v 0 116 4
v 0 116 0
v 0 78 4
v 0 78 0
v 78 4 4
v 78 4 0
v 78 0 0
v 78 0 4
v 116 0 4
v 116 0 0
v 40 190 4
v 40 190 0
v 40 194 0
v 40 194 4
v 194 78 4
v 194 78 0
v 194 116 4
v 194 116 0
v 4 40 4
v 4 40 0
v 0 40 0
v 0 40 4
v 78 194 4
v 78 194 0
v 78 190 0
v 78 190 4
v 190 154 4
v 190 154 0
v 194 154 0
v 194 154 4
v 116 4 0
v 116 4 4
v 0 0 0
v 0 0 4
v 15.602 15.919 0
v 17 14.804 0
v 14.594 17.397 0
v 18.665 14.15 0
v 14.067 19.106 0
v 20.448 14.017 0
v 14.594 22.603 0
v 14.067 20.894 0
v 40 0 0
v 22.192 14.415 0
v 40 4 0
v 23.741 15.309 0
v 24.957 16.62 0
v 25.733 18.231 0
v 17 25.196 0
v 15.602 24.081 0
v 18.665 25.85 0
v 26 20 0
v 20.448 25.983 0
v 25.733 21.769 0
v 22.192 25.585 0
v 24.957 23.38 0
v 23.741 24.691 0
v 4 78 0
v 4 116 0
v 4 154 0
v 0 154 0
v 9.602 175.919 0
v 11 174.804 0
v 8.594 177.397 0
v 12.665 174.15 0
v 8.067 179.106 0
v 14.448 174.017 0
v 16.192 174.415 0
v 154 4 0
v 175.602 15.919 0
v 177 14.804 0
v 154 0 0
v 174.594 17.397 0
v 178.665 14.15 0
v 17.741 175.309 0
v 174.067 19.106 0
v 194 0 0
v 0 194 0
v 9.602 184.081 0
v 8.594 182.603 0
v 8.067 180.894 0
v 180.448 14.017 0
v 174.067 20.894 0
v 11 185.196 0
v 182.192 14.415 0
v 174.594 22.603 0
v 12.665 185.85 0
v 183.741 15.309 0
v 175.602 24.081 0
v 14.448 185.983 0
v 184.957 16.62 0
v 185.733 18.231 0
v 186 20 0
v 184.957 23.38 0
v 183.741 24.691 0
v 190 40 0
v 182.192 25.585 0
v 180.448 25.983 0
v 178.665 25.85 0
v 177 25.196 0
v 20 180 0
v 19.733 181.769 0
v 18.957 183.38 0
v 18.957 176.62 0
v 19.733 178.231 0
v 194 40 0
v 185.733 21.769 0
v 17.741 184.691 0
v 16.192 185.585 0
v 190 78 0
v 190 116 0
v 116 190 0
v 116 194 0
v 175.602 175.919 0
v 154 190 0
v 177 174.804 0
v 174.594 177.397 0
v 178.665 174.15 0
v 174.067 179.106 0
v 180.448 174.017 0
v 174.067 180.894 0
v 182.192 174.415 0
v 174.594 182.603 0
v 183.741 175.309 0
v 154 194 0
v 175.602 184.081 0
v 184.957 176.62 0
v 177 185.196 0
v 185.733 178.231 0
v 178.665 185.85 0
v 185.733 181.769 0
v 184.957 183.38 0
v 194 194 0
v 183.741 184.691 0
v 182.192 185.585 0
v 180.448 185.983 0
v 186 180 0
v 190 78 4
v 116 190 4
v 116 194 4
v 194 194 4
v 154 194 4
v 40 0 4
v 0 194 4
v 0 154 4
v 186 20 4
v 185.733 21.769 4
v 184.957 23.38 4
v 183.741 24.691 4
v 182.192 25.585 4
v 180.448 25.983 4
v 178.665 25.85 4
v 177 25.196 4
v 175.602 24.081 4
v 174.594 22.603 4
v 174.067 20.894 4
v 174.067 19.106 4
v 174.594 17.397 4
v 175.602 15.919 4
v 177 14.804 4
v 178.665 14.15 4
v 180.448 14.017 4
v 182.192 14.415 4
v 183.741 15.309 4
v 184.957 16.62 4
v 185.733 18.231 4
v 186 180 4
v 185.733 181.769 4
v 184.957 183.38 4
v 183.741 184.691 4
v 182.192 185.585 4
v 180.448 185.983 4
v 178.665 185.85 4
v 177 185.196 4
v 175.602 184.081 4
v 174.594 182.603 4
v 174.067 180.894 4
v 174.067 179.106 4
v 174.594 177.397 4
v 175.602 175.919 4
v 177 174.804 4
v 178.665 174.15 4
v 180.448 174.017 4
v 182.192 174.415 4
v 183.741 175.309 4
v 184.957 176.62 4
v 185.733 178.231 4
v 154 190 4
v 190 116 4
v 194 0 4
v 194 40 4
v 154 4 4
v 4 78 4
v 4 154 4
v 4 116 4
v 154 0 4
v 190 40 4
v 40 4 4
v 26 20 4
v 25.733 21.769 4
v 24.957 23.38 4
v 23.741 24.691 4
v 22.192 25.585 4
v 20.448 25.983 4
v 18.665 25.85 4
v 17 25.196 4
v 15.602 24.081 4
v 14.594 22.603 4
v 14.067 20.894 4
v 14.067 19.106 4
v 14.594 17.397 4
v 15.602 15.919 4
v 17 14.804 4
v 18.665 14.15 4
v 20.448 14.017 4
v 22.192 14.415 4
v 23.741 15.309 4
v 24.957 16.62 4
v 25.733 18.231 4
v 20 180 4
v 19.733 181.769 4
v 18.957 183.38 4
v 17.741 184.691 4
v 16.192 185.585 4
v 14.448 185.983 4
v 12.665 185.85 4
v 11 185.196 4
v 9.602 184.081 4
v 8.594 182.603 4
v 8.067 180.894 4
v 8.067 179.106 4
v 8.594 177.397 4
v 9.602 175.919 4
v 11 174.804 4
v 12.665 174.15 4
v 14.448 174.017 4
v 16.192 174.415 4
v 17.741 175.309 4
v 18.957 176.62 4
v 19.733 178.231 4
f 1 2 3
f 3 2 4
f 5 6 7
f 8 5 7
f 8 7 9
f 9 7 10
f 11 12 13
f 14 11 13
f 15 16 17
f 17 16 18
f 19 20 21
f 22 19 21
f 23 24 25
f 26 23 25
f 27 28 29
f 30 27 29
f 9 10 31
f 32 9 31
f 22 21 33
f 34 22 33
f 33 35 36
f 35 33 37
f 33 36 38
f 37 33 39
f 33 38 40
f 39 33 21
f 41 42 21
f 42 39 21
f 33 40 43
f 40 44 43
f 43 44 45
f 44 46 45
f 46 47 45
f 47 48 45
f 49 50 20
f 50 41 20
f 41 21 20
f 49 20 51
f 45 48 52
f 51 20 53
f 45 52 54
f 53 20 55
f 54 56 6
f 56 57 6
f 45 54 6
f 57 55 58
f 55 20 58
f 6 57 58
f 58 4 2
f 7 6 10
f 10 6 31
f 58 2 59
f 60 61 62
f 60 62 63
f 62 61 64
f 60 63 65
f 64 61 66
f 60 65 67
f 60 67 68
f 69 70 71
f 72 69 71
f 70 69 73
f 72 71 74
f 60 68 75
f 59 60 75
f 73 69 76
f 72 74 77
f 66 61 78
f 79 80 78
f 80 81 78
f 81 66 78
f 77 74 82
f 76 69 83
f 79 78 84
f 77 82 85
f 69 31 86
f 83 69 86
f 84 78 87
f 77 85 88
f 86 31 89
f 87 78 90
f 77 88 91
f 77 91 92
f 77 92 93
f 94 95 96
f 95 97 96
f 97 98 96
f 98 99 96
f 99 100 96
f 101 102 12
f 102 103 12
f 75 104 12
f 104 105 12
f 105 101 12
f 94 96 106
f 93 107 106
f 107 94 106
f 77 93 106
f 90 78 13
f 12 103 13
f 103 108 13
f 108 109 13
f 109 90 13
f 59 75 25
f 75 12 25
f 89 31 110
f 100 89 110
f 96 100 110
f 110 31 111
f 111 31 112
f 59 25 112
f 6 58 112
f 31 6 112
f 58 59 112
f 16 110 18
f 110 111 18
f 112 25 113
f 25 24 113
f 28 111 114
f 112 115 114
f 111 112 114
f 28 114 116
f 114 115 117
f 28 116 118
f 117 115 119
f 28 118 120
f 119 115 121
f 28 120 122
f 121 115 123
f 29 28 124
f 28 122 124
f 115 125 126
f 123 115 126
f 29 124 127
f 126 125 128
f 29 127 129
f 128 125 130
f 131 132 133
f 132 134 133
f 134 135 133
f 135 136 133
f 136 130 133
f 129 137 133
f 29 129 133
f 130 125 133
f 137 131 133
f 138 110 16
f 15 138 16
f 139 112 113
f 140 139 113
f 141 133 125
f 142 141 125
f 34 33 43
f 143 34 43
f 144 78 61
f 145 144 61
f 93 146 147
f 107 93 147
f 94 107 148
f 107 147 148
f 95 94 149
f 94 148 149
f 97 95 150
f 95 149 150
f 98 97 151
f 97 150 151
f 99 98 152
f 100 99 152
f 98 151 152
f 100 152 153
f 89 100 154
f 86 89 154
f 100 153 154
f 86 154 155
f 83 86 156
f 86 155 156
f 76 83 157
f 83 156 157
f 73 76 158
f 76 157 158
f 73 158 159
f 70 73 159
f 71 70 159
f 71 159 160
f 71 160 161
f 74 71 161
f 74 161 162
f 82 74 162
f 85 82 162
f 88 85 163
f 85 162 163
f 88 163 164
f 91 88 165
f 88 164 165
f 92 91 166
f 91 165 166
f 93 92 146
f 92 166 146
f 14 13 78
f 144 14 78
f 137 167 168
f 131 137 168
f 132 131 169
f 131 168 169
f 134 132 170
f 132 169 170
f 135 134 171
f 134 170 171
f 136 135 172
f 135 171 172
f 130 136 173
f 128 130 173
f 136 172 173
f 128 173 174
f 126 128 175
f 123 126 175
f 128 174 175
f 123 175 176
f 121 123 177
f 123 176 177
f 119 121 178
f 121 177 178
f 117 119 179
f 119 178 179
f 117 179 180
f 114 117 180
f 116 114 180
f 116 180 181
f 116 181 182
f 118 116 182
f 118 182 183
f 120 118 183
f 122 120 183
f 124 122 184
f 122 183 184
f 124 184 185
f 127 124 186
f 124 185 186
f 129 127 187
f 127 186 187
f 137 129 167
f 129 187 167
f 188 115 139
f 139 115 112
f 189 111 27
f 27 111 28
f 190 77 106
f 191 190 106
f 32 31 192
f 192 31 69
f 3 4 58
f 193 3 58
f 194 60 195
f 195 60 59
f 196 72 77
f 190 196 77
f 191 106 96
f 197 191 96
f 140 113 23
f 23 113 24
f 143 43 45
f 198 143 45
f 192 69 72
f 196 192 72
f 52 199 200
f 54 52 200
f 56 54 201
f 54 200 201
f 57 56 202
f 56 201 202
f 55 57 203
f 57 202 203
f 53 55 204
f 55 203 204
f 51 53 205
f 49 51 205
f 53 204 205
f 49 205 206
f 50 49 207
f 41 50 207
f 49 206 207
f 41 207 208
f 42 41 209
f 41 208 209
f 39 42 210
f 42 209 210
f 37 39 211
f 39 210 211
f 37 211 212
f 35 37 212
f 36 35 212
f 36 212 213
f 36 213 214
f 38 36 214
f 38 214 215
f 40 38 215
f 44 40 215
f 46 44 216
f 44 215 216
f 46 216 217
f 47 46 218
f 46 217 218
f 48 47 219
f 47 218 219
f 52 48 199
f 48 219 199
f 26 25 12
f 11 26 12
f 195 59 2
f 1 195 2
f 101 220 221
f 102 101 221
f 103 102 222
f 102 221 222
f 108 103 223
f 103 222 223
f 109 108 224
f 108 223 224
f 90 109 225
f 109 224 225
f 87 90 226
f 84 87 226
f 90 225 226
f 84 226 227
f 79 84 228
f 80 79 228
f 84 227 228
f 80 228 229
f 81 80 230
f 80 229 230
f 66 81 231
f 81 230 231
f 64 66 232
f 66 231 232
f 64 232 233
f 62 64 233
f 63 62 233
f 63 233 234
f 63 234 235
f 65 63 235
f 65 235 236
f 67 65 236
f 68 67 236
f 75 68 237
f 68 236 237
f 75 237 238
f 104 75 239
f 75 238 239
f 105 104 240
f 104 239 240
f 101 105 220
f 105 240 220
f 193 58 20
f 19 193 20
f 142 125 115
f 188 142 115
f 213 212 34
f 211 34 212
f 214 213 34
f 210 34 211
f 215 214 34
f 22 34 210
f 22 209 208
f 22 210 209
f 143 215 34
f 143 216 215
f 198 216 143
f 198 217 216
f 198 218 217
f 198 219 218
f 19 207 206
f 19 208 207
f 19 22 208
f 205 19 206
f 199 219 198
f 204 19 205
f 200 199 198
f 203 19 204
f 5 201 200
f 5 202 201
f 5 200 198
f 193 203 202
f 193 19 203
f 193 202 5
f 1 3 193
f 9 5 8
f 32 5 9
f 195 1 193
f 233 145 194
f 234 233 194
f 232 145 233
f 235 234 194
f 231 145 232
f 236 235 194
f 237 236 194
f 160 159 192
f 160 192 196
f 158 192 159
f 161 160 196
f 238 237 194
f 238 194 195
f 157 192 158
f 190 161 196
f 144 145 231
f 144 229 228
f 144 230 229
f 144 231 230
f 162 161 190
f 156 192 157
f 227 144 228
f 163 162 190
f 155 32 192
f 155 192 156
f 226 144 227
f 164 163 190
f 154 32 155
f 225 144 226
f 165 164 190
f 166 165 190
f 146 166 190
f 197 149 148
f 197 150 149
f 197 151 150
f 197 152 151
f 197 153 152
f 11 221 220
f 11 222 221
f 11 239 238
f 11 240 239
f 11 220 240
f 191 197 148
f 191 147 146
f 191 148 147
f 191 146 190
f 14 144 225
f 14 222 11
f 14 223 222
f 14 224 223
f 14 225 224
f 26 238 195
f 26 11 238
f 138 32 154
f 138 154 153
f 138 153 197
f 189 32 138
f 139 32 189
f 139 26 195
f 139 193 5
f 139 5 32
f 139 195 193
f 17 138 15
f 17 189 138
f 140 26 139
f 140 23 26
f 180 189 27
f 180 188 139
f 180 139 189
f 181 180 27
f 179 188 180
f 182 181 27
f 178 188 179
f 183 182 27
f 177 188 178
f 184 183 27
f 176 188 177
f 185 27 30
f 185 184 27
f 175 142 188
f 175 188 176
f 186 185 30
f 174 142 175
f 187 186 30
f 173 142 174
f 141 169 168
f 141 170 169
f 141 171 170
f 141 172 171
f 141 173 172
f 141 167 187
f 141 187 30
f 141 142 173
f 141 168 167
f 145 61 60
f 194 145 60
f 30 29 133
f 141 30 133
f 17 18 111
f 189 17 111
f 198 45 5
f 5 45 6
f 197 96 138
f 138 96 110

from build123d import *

# Parameters (mm, degrees)
F1_DEPTH = 4
F2_R     = 6
F3_DEPTH = 4


with BuildPart() as f1:
    # F0 (on Top) → F1 (new body)
    with BuildSketch(Plane.XY):
        Polygon((0, 40), (0, 0), (40, 0), (40, 4), (78, 4), (78, 0), (116, 0), (116, 4), (154, 4), (154, 0), (194, 0), (194, 40), (190, 40), (190, 78), (194, 78), (194, 116), (190, 116), (190, 154), (194, 154), (194, 194), (154, 194), (154, 190), (116, 190), (116, 194), (78, 194), (78, 190), (40, 190), (40, 194), (0, 194), (0, 154), (4, 154), (4, 116), (0, 116), (0, 78), (4, 78), (4, 40), align=None)
    extrude(amount=F1_DEPTH)

    # F2 (on face) → F3 (cut)
    with BuildSketch(Plane.XY.offset(4)):
        with Locations((14, 180)):
            Circle(F2_R)
        with Locations((180, 180)):
            Circle(F2_R)
        with Locations((180, 20)):
            Circle(F2_R)
        with Locations((20, 20)):
            Circle(F2_R)
    extrude(amount=-F3_DEPTH, mode=Mode.SUBTRACT)


solid = f1.part
